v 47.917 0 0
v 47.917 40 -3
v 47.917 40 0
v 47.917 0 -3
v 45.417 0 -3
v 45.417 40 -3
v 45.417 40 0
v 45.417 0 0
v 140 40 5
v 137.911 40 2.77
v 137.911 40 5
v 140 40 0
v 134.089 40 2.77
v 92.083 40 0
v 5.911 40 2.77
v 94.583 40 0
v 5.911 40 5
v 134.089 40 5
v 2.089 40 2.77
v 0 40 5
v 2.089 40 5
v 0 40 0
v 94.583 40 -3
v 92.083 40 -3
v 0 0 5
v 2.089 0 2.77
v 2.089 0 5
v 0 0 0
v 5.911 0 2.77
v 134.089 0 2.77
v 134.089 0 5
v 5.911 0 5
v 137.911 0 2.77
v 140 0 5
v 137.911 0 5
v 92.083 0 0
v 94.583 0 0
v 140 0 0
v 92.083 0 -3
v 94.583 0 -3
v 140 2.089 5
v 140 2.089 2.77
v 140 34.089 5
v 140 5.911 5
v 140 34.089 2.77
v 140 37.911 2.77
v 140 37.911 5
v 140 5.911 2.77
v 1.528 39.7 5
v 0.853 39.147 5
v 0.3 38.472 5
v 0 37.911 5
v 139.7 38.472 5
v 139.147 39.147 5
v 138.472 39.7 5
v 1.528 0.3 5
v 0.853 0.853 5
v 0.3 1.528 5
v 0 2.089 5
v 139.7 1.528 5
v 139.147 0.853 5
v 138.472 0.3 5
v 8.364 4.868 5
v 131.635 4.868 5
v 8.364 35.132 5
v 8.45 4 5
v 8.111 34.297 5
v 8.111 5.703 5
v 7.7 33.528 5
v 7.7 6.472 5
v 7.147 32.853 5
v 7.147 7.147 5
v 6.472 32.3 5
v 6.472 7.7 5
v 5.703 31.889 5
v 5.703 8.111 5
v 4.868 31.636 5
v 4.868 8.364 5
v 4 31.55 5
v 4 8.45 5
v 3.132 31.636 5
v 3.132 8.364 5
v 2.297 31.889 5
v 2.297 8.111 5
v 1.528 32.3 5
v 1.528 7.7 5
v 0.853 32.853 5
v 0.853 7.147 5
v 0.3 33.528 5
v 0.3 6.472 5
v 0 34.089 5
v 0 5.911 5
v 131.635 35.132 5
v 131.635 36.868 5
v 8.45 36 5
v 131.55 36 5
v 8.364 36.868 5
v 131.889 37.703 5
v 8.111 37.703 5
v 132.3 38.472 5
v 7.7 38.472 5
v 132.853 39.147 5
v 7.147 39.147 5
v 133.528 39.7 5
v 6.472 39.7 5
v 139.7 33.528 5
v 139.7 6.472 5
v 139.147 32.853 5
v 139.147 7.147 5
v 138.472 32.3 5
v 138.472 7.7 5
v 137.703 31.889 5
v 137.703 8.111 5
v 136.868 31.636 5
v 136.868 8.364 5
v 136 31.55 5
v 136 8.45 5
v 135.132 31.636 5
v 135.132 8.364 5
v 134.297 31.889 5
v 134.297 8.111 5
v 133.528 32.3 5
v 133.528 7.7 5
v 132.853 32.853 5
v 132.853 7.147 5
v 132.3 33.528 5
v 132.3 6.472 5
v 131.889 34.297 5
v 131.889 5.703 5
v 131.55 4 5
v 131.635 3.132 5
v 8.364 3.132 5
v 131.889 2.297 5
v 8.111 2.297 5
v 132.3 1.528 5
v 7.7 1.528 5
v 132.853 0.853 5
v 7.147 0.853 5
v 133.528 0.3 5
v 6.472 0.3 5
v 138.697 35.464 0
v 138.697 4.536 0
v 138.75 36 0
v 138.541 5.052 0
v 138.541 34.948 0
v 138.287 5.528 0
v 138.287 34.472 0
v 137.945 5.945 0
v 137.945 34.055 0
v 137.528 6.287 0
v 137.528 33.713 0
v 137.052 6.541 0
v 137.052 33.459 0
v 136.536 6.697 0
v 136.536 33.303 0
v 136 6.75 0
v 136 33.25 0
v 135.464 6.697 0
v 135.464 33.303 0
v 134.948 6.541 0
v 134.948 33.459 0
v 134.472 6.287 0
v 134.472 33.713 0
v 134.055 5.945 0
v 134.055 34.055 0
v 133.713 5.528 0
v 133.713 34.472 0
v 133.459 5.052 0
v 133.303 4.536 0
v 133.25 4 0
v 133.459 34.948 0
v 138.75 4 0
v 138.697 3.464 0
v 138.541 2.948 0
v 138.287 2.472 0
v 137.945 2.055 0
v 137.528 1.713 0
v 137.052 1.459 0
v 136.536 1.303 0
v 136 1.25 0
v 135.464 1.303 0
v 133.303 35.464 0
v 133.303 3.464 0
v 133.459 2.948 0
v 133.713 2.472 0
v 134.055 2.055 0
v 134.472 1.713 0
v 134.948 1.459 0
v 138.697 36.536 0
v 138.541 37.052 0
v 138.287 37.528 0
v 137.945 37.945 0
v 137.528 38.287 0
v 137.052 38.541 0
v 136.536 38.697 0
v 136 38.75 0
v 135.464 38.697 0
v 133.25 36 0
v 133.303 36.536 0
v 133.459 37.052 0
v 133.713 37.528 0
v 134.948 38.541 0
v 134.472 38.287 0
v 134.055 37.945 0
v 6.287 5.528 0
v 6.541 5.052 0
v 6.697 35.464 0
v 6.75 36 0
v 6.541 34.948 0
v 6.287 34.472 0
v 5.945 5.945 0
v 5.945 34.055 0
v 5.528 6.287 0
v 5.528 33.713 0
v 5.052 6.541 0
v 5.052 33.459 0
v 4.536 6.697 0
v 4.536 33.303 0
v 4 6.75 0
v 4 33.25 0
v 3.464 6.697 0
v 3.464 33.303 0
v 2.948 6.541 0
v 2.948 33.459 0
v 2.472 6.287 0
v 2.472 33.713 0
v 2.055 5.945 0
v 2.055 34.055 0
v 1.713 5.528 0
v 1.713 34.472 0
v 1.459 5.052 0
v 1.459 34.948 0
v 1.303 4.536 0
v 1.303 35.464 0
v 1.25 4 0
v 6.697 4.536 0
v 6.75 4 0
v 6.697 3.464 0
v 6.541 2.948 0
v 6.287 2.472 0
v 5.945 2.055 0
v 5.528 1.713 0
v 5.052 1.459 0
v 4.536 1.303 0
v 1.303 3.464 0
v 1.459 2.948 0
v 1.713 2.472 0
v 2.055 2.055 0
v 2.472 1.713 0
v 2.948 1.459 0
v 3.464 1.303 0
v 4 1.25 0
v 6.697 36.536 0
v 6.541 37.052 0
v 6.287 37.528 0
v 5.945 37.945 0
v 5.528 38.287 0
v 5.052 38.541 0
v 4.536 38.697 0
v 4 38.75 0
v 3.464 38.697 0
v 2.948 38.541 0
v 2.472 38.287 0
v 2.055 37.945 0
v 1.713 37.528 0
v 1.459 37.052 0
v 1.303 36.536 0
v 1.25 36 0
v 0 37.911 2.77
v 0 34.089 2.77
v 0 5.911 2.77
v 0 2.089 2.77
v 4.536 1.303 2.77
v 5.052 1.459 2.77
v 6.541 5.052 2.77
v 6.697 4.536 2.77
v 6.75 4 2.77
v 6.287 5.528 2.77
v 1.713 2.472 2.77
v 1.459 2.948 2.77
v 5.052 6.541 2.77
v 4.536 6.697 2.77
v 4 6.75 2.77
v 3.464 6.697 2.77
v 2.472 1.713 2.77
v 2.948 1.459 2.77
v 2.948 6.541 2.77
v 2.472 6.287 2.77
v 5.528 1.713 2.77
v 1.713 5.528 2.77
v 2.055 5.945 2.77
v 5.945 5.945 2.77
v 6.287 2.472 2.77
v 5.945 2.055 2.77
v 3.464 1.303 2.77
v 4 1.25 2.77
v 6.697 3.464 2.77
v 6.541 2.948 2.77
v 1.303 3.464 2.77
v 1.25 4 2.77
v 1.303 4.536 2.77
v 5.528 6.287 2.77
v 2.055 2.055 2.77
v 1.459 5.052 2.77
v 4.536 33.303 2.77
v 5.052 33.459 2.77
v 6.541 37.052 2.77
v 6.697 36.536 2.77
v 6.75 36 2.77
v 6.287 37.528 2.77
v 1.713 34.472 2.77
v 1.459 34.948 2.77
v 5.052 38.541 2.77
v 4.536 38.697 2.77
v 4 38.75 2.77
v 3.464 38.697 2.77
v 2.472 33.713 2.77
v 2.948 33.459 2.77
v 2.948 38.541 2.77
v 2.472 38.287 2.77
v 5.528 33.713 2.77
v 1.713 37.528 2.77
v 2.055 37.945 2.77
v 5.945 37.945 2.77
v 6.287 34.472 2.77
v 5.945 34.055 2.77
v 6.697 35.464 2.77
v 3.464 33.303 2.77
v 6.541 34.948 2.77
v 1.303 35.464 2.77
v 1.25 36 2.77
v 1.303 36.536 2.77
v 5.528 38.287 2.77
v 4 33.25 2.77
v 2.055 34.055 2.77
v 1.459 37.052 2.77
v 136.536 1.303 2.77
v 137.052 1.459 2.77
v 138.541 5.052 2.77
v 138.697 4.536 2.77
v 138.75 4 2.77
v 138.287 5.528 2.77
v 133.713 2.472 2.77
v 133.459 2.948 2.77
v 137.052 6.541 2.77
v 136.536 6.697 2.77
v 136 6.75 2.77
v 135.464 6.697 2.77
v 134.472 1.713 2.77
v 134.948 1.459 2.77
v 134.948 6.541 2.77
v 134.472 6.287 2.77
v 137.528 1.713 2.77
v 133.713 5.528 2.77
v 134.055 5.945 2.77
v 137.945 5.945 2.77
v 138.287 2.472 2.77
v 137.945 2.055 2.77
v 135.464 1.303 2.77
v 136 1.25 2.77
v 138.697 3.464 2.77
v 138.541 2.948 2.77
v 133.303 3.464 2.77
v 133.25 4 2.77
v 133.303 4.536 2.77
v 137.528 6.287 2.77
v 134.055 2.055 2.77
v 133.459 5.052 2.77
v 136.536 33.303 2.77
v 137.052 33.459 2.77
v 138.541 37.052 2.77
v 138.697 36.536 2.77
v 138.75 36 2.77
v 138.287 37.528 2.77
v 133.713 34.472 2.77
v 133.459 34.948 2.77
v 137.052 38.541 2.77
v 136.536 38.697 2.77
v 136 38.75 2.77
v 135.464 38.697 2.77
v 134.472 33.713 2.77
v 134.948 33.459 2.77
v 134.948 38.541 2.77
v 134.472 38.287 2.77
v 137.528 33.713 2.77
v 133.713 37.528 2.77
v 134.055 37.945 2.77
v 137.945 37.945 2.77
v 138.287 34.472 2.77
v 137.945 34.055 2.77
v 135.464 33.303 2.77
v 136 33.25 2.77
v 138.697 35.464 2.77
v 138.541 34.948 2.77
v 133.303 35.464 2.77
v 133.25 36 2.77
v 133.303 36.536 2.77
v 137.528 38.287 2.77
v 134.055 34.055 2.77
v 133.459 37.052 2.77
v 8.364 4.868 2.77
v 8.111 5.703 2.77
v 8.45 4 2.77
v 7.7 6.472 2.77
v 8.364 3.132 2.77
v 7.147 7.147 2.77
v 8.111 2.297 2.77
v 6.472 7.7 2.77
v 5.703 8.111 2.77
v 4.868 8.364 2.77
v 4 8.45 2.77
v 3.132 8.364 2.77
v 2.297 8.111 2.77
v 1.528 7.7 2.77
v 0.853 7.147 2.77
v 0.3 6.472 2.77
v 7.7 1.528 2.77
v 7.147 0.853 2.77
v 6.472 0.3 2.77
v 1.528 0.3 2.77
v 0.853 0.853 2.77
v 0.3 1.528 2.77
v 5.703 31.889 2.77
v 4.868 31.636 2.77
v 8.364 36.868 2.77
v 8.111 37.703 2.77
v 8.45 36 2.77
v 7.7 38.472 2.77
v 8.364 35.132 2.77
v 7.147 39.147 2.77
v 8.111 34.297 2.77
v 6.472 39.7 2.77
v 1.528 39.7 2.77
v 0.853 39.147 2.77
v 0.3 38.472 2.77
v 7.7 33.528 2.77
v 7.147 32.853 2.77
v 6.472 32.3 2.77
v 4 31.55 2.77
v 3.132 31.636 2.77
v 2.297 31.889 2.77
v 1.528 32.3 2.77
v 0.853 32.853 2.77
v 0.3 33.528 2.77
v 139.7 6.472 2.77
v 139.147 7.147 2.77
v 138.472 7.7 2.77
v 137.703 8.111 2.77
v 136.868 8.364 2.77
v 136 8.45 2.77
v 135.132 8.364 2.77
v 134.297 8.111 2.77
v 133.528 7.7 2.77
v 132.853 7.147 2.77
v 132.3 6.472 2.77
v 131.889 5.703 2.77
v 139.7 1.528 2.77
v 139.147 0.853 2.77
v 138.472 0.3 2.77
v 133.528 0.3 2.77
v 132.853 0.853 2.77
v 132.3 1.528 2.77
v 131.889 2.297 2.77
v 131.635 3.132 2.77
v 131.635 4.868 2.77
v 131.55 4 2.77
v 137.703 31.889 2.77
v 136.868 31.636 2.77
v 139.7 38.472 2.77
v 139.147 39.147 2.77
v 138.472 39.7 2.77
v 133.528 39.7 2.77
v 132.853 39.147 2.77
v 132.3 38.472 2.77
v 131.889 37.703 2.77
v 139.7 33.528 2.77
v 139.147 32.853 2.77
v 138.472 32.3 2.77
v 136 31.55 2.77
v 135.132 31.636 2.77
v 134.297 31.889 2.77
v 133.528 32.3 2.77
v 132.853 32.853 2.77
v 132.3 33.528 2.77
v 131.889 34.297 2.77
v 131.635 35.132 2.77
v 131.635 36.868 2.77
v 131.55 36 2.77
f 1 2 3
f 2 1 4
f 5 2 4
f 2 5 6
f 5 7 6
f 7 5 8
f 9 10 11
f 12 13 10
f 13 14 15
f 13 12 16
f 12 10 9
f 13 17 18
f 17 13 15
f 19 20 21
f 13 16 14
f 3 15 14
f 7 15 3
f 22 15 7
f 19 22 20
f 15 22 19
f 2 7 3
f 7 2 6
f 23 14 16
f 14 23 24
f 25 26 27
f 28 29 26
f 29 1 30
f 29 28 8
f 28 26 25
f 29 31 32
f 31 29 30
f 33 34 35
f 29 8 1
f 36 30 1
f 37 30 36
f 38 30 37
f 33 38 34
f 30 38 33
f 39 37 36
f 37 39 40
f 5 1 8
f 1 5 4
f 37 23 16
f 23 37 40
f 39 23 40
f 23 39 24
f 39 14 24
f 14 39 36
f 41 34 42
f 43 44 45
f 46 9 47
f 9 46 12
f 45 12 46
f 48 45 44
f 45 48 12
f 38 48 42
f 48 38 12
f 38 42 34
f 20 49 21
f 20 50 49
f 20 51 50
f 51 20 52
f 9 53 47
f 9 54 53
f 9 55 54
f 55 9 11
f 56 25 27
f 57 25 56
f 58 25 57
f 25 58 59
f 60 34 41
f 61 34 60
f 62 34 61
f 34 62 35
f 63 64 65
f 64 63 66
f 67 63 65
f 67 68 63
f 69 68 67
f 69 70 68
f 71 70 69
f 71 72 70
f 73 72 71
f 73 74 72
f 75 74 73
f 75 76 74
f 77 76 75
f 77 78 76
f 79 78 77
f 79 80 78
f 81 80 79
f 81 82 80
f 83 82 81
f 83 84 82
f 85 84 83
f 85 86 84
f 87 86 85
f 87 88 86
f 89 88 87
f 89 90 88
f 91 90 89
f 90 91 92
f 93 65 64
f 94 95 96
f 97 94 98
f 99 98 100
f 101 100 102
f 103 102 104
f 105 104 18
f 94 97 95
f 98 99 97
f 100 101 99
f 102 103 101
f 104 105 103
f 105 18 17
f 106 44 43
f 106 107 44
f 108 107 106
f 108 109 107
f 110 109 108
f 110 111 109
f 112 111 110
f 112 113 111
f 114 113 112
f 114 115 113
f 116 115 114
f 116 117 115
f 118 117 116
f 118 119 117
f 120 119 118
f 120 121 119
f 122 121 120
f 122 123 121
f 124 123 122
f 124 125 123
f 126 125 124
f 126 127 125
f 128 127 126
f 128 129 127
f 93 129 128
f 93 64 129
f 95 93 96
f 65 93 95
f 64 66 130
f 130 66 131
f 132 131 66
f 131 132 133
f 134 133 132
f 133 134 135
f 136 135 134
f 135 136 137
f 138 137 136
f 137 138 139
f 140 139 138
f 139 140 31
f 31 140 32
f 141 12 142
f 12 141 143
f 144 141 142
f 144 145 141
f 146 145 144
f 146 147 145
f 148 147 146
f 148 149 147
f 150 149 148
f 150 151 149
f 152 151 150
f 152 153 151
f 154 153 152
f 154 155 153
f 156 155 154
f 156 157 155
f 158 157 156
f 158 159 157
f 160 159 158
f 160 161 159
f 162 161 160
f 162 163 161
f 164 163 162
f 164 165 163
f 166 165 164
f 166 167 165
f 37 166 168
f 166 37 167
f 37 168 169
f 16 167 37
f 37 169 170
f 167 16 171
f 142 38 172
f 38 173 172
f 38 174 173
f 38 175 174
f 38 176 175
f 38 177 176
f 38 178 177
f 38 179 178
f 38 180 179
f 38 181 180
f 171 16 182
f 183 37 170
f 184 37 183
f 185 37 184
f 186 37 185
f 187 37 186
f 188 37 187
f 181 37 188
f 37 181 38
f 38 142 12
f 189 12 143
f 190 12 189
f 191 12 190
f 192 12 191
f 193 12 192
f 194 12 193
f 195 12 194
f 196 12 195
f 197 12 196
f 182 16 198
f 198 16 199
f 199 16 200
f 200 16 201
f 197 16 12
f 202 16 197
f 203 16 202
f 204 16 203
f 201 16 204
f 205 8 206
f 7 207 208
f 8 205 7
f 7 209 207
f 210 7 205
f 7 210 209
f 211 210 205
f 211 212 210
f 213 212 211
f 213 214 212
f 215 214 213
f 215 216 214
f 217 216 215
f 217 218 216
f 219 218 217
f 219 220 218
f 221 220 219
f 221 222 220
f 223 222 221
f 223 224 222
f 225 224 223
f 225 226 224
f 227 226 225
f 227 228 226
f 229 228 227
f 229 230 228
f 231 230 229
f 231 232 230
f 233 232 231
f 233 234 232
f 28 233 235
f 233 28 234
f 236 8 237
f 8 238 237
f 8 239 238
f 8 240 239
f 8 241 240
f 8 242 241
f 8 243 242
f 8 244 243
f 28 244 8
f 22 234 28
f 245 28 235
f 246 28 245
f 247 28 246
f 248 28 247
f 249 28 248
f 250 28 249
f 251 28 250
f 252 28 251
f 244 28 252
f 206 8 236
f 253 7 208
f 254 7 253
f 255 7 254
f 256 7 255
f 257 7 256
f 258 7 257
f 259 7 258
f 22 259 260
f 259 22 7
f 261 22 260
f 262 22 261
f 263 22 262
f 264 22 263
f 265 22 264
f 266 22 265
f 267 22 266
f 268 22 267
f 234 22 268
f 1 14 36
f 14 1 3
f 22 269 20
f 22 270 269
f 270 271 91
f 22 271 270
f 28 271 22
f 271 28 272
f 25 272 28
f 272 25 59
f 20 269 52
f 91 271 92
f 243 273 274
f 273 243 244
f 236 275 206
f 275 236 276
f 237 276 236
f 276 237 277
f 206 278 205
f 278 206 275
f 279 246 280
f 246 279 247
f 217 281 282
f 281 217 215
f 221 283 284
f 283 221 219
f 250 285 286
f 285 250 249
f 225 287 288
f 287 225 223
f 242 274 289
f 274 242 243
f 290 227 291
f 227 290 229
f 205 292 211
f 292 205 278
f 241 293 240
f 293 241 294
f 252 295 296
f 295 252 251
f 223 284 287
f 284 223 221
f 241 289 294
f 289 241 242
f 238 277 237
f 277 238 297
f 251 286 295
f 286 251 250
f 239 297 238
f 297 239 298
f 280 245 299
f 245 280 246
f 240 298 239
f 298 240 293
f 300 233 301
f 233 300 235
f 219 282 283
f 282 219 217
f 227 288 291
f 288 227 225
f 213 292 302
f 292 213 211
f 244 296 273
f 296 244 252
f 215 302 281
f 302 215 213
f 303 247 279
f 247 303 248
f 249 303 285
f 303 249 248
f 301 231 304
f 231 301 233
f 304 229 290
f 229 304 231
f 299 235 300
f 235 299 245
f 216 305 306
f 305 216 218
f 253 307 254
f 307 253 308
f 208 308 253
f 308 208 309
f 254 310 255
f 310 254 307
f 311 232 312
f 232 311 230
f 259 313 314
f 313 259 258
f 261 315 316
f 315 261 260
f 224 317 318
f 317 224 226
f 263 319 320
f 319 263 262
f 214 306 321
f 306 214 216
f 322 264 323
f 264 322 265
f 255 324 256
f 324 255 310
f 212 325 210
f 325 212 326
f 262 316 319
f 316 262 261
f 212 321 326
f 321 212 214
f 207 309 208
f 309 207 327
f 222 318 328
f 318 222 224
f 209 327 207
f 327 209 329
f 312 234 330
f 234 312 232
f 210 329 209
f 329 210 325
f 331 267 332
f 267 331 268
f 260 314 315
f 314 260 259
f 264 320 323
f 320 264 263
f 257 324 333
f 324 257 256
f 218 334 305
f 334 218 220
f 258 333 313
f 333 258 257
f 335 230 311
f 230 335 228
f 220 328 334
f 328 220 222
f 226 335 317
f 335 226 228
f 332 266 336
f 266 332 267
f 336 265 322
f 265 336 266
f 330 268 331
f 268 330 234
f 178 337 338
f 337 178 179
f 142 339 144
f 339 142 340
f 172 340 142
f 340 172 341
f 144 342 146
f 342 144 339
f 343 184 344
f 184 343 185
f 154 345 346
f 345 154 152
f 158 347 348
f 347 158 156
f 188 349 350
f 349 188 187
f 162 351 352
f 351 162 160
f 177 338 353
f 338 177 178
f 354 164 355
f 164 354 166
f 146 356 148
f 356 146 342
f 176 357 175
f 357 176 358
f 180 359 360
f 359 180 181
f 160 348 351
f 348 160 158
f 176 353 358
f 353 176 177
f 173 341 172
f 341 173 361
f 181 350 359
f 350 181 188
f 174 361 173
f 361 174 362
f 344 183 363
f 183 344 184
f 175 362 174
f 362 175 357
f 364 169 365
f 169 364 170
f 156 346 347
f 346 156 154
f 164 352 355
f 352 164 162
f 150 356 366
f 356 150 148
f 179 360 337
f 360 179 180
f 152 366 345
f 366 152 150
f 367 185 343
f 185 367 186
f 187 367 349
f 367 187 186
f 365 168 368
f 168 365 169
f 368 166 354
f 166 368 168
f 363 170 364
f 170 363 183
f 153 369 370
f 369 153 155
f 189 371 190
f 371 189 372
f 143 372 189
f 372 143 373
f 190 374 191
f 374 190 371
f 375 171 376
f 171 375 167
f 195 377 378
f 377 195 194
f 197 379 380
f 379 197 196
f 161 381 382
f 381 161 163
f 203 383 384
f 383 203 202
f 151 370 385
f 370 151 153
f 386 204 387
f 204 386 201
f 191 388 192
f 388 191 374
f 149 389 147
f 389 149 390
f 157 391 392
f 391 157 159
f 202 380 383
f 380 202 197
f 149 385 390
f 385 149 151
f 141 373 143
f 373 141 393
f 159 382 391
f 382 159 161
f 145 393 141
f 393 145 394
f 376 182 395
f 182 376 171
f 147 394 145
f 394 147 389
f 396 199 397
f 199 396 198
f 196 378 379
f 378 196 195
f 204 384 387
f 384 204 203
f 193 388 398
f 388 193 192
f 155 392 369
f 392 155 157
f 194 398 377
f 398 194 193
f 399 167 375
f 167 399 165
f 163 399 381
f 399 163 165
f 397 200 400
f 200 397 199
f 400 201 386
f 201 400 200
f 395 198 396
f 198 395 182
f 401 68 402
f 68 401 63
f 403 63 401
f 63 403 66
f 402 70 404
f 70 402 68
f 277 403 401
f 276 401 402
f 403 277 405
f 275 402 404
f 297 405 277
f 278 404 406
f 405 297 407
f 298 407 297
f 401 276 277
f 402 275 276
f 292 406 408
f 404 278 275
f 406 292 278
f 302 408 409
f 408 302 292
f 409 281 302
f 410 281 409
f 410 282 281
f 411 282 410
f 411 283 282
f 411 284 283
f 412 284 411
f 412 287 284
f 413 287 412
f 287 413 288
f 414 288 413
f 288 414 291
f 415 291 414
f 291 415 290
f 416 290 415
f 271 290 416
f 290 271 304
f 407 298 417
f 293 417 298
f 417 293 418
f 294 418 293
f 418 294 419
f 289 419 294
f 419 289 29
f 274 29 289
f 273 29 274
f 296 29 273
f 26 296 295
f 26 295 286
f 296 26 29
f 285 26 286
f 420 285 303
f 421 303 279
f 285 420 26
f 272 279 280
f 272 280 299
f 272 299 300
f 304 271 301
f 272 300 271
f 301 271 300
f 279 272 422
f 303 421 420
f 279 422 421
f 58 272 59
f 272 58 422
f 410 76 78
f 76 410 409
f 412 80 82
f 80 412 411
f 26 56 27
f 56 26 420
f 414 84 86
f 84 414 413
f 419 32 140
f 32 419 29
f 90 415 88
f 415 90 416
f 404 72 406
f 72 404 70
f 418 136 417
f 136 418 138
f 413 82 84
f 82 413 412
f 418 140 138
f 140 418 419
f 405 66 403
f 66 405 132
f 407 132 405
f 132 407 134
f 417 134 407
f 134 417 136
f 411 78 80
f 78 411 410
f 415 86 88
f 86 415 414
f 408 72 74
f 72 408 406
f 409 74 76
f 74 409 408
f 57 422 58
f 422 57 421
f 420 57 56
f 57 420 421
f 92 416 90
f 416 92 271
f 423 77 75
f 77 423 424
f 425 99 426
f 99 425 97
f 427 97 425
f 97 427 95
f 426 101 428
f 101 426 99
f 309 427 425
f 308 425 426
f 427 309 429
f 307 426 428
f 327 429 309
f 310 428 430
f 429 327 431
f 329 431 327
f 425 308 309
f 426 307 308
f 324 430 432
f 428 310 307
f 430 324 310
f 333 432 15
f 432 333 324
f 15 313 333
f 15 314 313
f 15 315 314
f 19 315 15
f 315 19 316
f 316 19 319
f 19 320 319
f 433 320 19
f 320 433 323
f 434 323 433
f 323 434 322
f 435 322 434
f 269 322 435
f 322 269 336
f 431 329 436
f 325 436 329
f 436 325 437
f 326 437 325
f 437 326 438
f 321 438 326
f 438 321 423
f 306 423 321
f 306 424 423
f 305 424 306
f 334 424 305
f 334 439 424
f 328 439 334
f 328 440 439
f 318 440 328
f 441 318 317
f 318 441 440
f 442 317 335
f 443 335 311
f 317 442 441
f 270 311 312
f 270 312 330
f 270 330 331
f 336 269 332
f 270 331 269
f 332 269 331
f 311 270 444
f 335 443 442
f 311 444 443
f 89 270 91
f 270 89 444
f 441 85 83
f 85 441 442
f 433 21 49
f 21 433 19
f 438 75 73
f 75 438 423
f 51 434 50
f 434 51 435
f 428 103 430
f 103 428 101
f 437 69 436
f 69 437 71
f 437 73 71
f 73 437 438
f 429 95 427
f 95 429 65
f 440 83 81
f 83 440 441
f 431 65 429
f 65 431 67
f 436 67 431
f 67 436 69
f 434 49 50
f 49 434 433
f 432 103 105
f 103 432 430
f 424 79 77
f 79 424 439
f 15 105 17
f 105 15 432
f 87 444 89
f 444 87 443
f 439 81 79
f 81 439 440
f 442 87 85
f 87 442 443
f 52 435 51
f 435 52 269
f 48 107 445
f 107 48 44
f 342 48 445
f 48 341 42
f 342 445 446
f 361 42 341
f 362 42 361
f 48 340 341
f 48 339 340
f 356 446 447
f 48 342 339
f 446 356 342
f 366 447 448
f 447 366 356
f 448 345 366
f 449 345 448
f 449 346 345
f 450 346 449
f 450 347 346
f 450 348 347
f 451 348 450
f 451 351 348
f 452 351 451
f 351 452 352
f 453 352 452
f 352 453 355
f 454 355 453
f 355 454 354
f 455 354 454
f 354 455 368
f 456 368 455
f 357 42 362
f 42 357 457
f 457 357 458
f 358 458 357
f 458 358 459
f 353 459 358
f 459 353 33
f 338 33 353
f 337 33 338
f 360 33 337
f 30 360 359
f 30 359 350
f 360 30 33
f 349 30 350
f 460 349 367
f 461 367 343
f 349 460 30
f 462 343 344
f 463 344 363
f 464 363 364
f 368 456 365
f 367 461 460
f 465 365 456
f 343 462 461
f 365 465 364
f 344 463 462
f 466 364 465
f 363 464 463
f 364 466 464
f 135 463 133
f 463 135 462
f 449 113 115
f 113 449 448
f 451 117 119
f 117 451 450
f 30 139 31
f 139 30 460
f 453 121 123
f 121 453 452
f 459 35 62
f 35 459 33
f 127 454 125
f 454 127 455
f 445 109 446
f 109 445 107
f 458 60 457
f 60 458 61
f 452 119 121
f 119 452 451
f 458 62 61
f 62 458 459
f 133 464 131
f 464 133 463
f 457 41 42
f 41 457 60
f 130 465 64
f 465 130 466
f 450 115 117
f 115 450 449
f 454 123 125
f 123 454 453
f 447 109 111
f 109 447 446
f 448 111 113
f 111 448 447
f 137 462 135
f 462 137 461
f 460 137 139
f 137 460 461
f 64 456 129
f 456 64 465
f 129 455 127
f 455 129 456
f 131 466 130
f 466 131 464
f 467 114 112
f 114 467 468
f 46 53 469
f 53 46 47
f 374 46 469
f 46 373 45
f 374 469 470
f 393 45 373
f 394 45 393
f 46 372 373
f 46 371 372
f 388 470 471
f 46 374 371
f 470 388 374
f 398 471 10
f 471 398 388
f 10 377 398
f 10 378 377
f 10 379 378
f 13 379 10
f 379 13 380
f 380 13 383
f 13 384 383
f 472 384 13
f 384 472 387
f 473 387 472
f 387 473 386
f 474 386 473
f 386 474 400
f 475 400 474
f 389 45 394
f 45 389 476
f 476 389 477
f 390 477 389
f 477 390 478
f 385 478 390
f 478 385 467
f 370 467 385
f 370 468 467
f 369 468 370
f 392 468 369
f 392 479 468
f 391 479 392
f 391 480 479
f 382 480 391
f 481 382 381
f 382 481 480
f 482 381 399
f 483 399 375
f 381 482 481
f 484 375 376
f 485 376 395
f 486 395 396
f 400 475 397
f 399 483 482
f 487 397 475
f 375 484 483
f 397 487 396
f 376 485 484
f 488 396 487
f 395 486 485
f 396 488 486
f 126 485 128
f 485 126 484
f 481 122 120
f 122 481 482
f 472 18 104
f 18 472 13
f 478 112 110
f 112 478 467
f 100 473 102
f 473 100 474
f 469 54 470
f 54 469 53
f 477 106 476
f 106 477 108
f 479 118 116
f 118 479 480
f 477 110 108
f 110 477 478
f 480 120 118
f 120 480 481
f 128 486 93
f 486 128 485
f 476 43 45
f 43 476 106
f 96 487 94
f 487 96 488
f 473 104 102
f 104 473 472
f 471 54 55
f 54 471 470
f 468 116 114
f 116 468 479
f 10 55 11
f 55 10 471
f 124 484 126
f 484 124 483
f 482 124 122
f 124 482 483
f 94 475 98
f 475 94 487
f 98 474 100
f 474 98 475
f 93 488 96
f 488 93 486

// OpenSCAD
$fn = 32;

// ----------------------------------------------------------------------
// Enclosure lid: 140 x 40 x 5 mm, 4 bolt holes
// ----------------------------------------------------------------------

// --- parameters (mm) ---
length = 140;             // lid length, X
width = 40;               // lid width, Y
plate_t = 5;              // lid plate thickness
bolt_d = 5.5;             // bolt clearance
boss_lip = 4;             // bolt hole inset from the corner
sink = 1;                 // overlap of the lip and ribs into the plate
cs_d = 8.9;               // countersink diameter
cs_h = 2.23;              // countersink depth
rib_n = 2;                // stiffening ribs
rib_t = 2.5;              // rib thickness
rib_h = 4;                // rib height below the plate

module plate() {
  cube([length, width, plate_t]);
  /* stiffening ribs under the plate */
  for (i = [1 : rib_n]) translate([length * i / (rib_n + 1) - rib_t / 2, 0, -rib_h + sink]) cube([rib_t, width - 2 * 0, rib_h]);
}

difference() {
  plate();
  /* bolt pattern matching the corner bosses */
  for (sx = [0, 1]) for (sy = [0, 1])
    translate([sx * (length - 2 * boss_lip) + boss_lip, sy * (width - 2 * boss_lip) + boss_lip, -0 - 1])
      cylinder(h = plate_t + 0 + 2, d = bolt_d);
  /* countersinks so the heads sit flush */
  for (sx = [0, 1]) for (sy = [0, 1])
    translate([sx * (length - 2 * boss_lip) + boss_lip, sy * (width - 2 * boss_lip) + boss_lip, plate_t - cs_h])
      cylinder(h = cs_h + 0.5, d = cs_d);
}
